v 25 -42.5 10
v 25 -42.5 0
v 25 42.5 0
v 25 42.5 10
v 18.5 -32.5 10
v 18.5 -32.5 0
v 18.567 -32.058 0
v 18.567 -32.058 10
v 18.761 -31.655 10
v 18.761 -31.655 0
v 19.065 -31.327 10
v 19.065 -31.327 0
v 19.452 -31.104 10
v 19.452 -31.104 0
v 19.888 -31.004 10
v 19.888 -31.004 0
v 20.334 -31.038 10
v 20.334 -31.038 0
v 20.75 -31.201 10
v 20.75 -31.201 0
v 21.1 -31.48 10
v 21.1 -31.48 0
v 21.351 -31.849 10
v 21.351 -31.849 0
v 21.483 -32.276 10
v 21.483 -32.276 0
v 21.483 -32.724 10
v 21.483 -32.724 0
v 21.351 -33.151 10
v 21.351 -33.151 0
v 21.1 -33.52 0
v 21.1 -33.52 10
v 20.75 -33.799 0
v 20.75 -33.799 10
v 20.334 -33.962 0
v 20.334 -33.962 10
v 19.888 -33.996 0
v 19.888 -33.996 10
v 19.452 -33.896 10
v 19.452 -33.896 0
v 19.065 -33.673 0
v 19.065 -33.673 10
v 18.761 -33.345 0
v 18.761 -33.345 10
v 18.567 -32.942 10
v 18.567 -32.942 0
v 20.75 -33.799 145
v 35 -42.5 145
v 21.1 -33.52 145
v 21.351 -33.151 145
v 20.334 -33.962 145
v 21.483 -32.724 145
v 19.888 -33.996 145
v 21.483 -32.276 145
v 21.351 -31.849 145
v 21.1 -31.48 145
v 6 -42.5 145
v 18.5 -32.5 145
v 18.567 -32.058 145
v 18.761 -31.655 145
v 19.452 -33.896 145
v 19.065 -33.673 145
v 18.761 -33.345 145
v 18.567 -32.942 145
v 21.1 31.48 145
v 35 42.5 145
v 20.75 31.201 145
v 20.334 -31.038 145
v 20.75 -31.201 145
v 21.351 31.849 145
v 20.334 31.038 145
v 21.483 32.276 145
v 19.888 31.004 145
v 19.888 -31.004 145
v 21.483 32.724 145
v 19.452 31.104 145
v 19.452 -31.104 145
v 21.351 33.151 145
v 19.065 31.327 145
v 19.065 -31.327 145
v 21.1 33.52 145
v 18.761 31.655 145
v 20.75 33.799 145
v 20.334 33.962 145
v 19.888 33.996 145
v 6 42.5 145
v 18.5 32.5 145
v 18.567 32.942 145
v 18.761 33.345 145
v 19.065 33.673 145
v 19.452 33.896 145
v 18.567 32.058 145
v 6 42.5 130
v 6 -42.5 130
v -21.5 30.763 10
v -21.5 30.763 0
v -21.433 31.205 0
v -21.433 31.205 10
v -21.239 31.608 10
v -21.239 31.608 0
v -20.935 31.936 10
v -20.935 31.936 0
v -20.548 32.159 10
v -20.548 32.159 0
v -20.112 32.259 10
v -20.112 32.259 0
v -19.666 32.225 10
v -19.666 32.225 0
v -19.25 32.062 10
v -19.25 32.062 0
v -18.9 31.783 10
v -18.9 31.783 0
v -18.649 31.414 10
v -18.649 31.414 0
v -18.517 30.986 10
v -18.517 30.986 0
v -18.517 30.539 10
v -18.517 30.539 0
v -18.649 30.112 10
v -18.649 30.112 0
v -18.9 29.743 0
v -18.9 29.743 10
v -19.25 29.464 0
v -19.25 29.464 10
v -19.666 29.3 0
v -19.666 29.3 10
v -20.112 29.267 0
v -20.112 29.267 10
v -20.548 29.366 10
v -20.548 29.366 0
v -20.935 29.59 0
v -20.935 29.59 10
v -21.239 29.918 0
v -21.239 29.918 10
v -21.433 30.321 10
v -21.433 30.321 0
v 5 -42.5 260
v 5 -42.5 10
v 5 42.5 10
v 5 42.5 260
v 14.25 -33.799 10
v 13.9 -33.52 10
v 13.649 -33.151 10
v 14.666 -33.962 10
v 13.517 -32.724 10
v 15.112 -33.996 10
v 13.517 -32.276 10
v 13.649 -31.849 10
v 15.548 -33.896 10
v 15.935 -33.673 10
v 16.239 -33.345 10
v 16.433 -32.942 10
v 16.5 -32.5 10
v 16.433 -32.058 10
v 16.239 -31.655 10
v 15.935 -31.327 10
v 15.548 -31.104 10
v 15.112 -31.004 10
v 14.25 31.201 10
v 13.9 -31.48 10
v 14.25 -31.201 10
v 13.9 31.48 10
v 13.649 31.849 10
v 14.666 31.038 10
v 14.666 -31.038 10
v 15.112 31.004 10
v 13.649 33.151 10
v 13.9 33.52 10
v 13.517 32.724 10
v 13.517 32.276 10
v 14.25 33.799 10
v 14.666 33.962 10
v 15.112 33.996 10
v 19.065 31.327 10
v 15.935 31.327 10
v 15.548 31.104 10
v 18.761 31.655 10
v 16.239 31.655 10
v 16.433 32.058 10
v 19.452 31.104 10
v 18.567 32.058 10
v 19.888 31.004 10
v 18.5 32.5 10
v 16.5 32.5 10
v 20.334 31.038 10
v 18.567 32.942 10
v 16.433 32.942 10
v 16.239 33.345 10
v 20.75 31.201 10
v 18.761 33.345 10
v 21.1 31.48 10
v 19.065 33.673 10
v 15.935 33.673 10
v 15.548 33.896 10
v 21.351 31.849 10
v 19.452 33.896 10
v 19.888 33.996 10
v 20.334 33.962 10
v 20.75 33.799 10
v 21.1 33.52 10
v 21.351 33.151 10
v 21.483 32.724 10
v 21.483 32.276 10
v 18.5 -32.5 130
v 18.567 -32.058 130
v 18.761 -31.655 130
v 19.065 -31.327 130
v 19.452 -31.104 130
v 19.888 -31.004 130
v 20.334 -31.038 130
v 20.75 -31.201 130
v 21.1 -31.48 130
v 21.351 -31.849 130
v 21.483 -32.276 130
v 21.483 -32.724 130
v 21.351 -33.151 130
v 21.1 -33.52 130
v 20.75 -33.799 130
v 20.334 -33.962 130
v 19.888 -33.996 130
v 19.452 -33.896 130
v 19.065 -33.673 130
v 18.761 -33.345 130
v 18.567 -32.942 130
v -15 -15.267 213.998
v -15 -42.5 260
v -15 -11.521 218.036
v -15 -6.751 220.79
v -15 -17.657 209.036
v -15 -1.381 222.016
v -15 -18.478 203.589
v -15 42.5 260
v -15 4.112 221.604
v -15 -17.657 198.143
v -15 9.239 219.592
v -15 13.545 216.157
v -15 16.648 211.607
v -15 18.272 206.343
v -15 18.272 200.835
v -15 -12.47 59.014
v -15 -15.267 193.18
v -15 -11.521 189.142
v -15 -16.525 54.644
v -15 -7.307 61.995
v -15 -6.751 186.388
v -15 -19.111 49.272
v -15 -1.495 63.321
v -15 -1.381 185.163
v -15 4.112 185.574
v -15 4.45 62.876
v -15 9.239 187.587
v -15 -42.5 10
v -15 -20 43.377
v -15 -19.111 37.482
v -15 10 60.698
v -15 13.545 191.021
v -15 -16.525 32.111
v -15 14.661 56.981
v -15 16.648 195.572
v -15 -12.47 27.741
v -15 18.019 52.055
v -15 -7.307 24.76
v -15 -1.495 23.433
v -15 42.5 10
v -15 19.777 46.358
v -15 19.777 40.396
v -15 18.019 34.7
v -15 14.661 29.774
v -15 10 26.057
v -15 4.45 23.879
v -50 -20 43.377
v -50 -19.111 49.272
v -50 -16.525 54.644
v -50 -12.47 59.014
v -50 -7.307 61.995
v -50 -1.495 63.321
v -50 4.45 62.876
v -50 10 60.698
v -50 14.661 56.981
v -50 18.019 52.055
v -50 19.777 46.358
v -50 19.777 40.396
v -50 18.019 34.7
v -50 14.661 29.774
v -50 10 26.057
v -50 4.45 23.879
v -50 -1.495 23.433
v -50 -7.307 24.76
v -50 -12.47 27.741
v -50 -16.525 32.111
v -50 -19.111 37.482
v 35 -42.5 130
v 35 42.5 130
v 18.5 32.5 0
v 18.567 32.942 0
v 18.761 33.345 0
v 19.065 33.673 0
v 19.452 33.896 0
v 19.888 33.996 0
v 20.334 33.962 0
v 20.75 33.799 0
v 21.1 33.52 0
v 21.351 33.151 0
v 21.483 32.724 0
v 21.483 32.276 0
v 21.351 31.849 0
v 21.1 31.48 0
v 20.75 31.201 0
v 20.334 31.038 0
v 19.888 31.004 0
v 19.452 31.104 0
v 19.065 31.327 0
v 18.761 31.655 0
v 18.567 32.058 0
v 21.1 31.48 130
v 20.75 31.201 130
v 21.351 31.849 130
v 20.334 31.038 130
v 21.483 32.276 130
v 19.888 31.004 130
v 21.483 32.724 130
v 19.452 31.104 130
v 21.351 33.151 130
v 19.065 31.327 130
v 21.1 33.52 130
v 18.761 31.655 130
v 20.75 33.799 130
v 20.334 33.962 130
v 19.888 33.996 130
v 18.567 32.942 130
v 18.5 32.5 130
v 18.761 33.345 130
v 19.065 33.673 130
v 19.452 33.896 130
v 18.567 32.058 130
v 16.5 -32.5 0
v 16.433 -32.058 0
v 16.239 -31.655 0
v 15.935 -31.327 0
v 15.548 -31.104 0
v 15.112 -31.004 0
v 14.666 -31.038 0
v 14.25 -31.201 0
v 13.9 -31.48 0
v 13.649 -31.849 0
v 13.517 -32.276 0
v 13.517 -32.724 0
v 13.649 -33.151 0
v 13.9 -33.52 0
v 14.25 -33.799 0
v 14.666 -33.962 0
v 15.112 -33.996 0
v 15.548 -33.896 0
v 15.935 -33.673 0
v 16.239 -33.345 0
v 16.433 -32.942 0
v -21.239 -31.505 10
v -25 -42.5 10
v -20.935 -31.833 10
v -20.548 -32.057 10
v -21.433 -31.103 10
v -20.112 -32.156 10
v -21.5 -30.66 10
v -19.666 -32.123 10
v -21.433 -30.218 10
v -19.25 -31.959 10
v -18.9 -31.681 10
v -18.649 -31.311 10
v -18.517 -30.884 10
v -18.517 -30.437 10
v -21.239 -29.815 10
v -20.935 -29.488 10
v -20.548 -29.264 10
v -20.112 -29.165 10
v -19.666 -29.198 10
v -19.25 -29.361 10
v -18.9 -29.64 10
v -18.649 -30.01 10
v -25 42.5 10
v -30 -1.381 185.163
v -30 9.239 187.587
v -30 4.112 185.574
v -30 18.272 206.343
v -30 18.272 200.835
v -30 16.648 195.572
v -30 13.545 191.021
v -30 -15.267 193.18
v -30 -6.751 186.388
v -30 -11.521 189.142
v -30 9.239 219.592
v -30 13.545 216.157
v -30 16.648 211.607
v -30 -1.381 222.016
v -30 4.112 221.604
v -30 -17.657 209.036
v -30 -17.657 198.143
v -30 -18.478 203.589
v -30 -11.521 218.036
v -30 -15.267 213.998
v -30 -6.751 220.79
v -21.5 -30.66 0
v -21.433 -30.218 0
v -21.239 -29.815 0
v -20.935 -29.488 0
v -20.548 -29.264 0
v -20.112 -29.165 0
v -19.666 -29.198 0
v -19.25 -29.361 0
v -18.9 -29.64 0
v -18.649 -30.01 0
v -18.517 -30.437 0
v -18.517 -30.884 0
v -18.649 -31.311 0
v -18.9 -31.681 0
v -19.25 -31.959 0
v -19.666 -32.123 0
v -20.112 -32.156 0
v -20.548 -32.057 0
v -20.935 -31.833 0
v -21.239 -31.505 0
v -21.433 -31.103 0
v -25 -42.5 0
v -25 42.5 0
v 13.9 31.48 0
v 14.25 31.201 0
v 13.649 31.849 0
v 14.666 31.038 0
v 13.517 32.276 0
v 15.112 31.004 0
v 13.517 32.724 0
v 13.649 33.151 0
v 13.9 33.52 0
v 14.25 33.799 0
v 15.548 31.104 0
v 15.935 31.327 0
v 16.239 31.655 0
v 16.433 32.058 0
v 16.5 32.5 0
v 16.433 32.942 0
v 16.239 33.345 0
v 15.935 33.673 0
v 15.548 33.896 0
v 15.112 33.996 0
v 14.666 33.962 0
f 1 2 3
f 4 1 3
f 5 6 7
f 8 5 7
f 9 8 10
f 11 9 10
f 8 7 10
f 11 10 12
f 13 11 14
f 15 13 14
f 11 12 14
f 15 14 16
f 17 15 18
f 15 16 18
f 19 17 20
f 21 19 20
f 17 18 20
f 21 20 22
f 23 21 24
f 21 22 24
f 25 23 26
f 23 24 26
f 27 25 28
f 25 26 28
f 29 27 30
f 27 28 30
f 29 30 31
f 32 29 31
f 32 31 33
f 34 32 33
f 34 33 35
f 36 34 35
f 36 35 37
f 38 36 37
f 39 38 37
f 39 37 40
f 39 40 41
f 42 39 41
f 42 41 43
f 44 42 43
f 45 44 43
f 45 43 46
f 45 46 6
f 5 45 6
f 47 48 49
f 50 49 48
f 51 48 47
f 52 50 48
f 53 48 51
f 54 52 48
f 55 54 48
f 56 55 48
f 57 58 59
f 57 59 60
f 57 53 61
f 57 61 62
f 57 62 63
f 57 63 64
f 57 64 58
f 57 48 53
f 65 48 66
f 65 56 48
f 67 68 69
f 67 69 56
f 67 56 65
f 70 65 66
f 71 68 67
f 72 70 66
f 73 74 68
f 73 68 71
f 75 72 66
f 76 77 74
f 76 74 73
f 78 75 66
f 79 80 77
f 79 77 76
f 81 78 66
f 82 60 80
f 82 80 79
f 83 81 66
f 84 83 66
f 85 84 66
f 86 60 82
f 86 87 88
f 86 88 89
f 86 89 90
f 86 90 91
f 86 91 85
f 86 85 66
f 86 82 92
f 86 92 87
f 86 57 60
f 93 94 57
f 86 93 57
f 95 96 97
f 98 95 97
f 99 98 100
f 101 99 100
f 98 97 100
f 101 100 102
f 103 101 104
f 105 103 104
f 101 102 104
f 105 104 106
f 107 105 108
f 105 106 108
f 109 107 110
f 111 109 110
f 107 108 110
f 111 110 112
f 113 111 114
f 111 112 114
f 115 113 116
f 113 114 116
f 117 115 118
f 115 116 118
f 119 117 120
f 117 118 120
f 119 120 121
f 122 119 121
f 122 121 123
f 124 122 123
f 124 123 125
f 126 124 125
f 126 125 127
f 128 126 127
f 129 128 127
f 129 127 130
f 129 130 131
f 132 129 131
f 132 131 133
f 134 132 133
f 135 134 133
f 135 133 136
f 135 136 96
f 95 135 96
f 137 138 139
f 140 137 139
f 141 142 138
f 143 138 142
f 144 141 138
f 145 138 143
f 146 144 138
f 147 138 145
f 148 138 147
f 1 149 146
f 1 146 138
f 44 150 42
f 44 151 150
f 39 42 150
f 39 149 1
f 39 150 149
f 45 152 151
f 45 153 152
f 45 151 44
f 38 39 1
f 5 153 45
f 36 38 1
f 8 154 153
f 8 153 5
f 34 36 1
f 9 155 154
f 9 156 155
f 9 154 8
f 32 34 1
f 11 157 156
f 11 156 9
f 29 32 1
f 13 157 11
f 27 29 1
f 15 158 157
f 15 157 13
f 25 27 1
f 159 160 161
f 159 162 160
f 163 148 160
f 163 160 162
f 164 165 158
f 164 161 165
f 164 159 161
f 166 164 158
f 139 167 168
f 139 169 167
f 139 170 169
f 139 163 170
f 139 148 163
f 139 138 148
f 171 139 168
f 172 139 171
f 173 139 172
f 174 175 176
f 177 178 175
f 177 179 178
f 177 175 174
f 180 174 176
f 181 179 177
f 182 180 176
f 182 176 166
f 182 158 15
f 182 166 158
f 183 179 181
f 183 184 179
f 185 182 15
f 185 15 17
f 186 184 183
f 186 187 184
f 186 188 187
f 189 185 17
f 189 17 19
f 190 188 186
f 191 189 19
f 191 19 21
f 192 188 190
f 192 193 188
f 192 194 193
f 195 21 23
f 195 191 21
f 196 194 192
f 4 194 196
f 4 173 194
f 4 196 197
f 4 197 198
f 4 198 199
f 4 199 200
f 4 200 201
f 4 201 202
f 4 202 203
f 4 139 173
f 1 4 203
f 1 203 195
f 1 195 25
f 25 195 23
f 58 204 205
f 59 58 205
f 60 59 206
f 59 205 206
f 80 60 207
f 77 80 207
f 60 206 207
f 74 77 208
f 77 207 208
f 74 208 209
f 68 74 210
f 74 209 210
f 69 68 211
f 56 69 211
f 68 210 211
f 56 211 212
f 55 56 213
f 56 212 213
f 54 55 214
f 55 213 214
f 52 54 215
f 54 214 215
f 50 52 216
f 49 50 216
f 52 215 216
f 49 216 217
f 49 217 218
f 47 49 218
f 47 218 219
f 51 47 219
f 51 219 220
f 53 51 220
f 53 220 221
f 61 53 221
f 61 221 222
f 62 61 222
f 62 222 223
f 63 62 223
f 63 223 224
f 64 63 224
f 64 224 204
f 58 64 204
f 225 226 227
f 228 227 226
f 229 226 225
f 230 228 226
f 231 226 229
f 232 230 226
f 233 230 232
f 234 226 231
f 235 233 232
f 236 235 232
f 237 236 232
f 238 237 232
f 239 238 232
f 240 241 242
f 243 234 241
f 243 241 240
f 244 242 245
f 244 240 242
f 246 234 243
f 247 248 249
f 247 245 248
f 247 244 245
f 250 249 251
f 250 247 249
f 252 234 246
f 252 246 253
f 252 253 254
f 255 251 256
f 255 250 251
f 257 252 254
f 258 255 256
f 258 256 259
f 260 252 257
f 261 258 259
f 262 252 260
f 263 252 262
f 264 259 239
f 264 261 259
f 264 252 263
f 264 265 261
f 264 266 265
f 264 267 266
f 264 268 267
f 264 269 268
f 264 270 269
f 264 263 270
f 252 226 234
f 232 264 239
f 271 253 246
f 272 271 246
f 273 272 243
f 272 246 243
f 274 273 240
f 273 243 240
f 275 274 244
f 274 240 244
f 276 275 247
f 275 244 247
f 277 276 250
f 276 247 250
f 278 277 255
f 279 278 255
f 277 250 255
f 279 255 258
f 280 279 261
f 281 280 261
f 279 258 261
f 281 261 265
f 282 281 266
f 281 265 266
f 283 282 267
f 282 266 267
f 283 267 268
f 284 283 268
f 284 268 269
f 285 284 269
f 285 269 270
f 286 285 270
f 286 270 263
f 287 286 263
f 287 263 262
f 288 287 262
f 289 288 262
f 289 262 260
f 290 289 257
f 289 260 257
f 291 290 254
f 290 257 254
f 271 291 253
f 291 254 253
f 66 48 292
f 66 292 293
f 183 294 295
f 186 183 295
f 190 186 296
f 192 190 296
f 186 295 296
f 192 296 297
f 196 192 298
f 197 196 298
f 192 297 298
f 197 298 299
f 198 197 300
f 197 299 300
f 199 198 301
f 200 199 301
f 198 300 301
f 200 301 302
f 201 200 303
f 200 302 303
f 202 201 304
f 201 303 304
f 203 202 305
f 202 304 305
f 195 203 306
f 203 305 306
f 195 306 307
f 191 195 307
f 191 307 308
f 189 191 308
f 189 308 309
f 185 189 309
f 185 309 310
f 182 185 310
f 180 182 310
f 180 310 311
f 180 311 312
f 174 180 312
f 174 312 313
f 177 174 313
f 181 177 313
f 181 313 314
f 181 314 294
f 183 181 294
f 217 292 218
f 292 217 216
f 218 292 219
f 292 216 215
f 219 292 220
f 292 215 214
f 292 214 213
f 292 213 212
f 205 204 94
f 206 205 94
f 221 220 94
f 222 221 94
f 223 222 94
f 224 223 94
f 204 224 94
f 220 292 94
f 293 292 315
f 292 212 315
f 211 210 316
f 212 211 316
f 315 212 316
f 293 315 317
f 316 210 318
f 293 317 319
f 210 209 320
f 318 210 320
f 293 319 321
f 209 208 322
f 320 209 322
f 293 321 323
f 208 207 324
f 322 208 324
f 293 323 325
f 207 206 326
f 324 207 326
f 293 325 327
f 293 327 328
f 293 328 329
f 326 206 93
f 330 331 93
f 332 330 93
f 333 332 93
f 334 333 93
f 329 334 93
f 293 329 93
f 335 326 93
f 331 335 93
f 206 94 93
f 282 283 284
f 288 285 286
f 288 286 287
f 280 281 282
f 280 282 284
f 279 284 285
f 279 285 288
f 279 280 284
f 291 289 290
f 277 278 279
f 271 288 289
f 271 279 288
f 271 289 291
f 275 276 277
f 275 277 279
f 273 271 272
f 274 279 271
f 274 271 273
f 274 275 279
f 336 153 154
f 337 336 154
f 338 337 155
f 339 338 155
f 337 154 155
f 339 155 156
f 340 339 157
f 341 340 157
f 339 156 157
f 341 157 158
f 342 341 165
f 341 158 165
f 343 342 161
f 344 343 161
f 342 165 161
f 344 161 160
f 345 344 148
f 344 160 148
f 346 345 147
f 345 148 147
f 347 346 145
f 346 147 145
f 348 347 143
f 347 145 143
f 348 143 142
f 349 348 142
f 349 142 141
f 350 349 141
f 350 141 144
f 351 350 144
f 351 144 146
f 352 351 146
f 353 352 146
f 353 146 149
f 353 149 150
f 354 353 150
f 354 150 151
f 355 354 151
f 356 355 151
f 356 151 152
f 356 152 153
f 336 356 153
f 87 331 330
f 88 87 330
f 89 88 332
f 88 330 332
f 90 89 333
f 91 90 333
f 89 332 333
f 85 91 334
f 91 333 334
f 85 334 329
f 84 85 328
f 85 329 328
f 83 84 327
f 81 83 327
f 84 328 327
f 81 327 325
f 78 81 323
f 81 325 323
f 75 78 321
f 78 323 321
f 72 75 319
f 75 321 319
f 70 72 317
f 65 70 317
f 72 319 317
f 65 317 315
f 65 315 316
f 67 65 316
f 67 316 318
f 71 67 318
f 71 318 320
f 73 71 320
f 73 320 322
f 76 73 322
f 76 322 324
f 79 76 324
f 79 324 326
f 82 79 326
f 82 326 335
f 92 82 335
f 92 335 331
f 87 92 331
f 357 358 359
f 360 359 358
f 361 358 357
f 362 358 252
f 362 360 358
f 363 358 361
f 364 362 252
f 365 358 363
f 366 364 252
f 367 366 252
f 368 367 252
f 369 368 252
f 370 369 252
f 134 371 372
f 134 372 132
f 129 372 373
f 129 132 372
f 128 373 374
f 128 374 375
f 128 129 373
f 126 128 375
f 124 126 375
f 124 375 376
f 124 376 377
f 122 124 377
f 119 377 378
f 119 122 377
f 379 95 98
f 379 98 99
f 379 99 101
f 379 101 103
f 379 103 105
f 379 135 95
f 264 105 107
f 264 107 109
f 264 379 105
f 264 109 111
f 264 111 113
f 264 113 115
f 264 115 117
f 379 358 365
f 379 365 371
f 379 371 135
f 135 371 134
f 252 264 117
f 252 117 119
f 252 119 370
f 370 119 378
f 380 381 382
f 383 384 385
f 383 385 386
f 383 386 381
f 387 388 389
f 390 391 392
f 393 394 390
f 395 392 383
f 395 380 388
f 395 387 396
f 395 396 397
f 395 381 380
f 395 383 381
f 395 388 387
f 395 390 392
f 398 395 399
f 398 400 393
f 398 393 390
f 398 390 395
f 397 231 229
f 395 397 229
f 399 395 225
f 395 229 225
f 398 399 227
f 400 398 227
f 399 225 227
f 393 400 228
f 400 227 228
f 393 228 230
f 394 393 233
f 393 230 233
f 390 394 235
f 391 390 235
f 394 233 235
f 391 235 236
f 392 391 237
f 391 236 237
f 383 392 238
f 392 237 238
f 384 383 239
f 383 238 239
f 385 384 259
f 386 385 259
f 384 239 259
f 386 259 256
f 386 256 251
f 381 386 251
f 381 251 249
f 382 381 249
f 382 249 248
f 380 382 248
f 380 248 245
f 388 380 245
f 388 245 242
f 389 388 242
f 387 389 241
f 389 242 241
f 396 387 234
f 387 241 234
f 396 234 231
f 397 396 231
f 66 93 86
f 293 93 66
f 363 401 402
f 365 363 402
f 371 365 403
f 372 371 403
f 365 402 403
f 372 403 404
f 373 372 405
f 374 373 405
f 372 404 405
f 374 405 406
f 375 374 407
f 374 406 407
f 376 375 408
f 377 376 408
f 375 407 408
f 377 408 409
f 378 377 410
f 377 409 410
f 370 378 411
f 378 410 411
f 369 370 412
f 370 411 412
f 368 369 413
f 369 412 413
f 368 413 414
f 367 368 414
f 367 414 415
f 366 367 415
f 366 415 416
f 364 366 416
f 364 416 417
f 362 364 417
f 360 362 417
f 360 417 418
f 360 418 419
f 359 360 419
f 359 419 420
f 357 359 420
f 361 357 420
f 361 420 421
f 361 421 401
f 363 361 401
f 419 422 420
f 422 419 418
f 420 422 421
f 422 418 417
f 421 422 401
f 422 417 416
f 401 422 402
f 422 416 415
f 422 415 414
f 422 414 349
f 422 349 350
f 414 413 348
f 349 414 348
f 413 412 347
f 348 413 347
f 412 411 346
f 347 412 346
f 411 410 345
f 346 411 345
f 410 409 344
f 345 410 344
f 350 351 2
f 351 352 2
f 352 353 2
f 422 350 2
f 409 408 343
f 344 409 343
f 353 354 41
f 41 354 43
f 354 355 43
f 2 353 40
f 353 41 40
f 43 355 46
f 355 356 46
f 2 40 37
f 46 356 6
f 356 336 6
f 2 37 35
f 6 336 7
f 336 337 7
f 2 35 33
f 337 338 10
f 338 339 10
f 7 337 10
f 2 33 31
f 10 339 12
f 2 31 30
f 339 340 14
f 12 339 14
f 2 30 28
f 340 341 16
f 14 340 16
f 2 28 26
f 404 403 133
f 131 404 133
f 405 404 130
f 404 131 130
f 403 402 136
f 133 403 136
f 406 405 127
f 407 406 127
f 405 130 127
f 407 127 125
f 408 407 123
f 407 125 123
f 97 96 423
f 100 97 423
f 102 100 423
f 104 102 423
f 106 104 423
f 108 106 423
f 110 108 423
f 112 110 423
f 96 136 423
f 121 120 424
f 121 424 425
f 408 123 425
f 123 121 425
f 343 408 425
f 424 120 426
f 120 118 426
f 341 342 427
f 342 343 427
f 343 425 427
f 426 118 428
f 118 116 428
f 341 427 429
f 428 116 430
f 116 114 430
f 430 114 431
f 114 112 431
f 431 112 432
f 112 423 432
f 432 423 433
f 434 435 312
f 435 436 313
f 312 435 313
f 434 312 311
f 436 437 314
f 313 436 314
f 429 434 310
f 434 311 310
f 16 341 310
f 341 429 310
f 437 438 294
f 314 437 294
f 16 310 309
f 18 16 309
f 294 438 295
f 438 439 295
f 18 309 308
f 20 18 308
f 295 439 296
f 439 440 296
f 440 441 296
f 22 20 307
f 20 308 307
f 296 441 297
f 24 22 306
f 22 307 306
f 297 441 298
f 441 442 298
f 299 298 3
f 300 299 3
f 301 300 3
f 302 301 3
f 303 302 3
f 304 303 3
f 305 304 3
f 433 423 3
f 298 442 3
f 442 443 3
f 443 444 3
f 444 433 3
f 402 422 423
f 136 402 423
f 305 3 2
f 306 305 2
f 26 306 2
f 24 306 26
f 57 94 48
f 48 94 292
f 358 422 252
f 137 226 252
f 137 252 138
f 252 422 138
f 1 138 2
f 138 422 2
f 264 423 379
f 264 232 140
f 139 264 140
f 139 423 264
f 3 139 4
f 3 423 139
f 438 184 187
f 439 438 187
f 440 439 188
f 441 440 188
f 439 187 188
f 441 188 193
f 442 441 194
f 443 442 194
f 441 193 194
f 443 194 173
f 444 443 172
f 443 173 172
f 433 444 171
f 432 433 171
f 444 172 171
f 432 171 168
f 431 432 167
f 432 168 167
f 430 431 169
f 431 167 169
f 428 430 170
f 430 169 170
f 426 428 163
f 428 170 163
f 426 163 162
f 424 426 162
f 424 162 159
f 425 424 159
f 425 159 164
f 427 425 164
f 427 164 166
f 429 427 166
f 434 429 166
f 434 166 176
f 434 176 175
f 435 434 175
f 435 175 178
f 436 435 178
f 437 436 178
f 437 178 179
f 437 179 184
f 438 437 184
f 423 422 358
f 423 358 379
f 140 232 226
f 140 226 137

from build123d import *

# Parameters (mm, degrees)
F0_W           = 50
F0_H           = 85
F1_DEPTH       = 10
F2_W           = 20
F2_H           = 85
F3_DEPTH       = 250
F4_W           = 85
F4_H           = 15
F5_DEPTH       = 30
F9_D           = 3
F9_ON_F6_D     = 3
F9_ON_F8_D     = 3
F9_ON_F8_DEPTH = 10.001
F10_R          = 20
F11_DEPTH      = 35
F12_R          = 18.4780658122
F13_DEPTH      = 15
F14_W          = 1
F14_H          = 15
F15_DEPTH      = 85


with BuildPart() as f1:
    # F0 (on Top) → F1 (new body)
    with BuildSketch(Plane.XY):
        Rectangle(F0_W, F0_H)
    extrude(amount=F1_DEPTH)

    # F2 (on face) → F3 (join)
    with BuildSketch(Plane.XY.offset(10)):
        with Locations((-5, 0)):
            Rectangle(F2_W, F2_H)
    extrude(amount=F3_DEPTH)

    # F4 (on face) → F5 (join)
    with BuildSketch(Plane.YZ.offset(5)):
        with Locations((0, 137.5)):
            Rectangle(F4_W, F4_H)
    extrude(amount=F5_DEPTH)

    # F9 (through all)
    with Locations(Plane.XY.offset(145)):
        with Locations((20, 32.5), (20, -32.5)):
            Hole(F9_D / 2)

    # F9 on F6 (through all)
    with Locations(Plane.XY.offset(10)):
        with Locations((-20, 30.7627674192), (-20, -30.6603964418)):
            Hole(F9_ON_F6_D / 2)

    # F9 on F8 (through all, one way)
    with BuildSketch(Plane.XY.offset(10)):
        with Locations((15, -32.5), (15, 32.5)):
            Circle(F9_ON_F8_D / 2)
    extrude(amount=-F9_ON_F8_DEPTH, mode=Mode.SUBTRACT)

    # F10 (on face) → F11 (join)
    with BuildSketch(Plane(origin=(-15, 0, 0), x_dir=(0, -1, 0), z_dir=(-1, 0, 0))):
        with Locations((0, 43.3772418691)):
            Circle(F10_R)
    extrude(amount=F11_DEPTH)

    # F12 (on face) → F13 (join)
    with BuildSketch(Plane(origin=(-15, 0, 0), x_dir=(0, -1, 0), z_dir=(-1, 0, 0))):
        with Locations((0, 203.5892009735)):
            Circle(F12_R)
    extrude(amount=F13_DEPTH)

    # F14 (on face) → F15 (cut, through all)
    with BuildSketch(Plane.XZ.offset(42.5)):
        with Locations((5.5, 137.5)):
            Rectangle(F14_W, F14_H)
    extrude(amount=-F15_DEPTH, mode=Mode.SUBTRACT)


solid = f1.part
